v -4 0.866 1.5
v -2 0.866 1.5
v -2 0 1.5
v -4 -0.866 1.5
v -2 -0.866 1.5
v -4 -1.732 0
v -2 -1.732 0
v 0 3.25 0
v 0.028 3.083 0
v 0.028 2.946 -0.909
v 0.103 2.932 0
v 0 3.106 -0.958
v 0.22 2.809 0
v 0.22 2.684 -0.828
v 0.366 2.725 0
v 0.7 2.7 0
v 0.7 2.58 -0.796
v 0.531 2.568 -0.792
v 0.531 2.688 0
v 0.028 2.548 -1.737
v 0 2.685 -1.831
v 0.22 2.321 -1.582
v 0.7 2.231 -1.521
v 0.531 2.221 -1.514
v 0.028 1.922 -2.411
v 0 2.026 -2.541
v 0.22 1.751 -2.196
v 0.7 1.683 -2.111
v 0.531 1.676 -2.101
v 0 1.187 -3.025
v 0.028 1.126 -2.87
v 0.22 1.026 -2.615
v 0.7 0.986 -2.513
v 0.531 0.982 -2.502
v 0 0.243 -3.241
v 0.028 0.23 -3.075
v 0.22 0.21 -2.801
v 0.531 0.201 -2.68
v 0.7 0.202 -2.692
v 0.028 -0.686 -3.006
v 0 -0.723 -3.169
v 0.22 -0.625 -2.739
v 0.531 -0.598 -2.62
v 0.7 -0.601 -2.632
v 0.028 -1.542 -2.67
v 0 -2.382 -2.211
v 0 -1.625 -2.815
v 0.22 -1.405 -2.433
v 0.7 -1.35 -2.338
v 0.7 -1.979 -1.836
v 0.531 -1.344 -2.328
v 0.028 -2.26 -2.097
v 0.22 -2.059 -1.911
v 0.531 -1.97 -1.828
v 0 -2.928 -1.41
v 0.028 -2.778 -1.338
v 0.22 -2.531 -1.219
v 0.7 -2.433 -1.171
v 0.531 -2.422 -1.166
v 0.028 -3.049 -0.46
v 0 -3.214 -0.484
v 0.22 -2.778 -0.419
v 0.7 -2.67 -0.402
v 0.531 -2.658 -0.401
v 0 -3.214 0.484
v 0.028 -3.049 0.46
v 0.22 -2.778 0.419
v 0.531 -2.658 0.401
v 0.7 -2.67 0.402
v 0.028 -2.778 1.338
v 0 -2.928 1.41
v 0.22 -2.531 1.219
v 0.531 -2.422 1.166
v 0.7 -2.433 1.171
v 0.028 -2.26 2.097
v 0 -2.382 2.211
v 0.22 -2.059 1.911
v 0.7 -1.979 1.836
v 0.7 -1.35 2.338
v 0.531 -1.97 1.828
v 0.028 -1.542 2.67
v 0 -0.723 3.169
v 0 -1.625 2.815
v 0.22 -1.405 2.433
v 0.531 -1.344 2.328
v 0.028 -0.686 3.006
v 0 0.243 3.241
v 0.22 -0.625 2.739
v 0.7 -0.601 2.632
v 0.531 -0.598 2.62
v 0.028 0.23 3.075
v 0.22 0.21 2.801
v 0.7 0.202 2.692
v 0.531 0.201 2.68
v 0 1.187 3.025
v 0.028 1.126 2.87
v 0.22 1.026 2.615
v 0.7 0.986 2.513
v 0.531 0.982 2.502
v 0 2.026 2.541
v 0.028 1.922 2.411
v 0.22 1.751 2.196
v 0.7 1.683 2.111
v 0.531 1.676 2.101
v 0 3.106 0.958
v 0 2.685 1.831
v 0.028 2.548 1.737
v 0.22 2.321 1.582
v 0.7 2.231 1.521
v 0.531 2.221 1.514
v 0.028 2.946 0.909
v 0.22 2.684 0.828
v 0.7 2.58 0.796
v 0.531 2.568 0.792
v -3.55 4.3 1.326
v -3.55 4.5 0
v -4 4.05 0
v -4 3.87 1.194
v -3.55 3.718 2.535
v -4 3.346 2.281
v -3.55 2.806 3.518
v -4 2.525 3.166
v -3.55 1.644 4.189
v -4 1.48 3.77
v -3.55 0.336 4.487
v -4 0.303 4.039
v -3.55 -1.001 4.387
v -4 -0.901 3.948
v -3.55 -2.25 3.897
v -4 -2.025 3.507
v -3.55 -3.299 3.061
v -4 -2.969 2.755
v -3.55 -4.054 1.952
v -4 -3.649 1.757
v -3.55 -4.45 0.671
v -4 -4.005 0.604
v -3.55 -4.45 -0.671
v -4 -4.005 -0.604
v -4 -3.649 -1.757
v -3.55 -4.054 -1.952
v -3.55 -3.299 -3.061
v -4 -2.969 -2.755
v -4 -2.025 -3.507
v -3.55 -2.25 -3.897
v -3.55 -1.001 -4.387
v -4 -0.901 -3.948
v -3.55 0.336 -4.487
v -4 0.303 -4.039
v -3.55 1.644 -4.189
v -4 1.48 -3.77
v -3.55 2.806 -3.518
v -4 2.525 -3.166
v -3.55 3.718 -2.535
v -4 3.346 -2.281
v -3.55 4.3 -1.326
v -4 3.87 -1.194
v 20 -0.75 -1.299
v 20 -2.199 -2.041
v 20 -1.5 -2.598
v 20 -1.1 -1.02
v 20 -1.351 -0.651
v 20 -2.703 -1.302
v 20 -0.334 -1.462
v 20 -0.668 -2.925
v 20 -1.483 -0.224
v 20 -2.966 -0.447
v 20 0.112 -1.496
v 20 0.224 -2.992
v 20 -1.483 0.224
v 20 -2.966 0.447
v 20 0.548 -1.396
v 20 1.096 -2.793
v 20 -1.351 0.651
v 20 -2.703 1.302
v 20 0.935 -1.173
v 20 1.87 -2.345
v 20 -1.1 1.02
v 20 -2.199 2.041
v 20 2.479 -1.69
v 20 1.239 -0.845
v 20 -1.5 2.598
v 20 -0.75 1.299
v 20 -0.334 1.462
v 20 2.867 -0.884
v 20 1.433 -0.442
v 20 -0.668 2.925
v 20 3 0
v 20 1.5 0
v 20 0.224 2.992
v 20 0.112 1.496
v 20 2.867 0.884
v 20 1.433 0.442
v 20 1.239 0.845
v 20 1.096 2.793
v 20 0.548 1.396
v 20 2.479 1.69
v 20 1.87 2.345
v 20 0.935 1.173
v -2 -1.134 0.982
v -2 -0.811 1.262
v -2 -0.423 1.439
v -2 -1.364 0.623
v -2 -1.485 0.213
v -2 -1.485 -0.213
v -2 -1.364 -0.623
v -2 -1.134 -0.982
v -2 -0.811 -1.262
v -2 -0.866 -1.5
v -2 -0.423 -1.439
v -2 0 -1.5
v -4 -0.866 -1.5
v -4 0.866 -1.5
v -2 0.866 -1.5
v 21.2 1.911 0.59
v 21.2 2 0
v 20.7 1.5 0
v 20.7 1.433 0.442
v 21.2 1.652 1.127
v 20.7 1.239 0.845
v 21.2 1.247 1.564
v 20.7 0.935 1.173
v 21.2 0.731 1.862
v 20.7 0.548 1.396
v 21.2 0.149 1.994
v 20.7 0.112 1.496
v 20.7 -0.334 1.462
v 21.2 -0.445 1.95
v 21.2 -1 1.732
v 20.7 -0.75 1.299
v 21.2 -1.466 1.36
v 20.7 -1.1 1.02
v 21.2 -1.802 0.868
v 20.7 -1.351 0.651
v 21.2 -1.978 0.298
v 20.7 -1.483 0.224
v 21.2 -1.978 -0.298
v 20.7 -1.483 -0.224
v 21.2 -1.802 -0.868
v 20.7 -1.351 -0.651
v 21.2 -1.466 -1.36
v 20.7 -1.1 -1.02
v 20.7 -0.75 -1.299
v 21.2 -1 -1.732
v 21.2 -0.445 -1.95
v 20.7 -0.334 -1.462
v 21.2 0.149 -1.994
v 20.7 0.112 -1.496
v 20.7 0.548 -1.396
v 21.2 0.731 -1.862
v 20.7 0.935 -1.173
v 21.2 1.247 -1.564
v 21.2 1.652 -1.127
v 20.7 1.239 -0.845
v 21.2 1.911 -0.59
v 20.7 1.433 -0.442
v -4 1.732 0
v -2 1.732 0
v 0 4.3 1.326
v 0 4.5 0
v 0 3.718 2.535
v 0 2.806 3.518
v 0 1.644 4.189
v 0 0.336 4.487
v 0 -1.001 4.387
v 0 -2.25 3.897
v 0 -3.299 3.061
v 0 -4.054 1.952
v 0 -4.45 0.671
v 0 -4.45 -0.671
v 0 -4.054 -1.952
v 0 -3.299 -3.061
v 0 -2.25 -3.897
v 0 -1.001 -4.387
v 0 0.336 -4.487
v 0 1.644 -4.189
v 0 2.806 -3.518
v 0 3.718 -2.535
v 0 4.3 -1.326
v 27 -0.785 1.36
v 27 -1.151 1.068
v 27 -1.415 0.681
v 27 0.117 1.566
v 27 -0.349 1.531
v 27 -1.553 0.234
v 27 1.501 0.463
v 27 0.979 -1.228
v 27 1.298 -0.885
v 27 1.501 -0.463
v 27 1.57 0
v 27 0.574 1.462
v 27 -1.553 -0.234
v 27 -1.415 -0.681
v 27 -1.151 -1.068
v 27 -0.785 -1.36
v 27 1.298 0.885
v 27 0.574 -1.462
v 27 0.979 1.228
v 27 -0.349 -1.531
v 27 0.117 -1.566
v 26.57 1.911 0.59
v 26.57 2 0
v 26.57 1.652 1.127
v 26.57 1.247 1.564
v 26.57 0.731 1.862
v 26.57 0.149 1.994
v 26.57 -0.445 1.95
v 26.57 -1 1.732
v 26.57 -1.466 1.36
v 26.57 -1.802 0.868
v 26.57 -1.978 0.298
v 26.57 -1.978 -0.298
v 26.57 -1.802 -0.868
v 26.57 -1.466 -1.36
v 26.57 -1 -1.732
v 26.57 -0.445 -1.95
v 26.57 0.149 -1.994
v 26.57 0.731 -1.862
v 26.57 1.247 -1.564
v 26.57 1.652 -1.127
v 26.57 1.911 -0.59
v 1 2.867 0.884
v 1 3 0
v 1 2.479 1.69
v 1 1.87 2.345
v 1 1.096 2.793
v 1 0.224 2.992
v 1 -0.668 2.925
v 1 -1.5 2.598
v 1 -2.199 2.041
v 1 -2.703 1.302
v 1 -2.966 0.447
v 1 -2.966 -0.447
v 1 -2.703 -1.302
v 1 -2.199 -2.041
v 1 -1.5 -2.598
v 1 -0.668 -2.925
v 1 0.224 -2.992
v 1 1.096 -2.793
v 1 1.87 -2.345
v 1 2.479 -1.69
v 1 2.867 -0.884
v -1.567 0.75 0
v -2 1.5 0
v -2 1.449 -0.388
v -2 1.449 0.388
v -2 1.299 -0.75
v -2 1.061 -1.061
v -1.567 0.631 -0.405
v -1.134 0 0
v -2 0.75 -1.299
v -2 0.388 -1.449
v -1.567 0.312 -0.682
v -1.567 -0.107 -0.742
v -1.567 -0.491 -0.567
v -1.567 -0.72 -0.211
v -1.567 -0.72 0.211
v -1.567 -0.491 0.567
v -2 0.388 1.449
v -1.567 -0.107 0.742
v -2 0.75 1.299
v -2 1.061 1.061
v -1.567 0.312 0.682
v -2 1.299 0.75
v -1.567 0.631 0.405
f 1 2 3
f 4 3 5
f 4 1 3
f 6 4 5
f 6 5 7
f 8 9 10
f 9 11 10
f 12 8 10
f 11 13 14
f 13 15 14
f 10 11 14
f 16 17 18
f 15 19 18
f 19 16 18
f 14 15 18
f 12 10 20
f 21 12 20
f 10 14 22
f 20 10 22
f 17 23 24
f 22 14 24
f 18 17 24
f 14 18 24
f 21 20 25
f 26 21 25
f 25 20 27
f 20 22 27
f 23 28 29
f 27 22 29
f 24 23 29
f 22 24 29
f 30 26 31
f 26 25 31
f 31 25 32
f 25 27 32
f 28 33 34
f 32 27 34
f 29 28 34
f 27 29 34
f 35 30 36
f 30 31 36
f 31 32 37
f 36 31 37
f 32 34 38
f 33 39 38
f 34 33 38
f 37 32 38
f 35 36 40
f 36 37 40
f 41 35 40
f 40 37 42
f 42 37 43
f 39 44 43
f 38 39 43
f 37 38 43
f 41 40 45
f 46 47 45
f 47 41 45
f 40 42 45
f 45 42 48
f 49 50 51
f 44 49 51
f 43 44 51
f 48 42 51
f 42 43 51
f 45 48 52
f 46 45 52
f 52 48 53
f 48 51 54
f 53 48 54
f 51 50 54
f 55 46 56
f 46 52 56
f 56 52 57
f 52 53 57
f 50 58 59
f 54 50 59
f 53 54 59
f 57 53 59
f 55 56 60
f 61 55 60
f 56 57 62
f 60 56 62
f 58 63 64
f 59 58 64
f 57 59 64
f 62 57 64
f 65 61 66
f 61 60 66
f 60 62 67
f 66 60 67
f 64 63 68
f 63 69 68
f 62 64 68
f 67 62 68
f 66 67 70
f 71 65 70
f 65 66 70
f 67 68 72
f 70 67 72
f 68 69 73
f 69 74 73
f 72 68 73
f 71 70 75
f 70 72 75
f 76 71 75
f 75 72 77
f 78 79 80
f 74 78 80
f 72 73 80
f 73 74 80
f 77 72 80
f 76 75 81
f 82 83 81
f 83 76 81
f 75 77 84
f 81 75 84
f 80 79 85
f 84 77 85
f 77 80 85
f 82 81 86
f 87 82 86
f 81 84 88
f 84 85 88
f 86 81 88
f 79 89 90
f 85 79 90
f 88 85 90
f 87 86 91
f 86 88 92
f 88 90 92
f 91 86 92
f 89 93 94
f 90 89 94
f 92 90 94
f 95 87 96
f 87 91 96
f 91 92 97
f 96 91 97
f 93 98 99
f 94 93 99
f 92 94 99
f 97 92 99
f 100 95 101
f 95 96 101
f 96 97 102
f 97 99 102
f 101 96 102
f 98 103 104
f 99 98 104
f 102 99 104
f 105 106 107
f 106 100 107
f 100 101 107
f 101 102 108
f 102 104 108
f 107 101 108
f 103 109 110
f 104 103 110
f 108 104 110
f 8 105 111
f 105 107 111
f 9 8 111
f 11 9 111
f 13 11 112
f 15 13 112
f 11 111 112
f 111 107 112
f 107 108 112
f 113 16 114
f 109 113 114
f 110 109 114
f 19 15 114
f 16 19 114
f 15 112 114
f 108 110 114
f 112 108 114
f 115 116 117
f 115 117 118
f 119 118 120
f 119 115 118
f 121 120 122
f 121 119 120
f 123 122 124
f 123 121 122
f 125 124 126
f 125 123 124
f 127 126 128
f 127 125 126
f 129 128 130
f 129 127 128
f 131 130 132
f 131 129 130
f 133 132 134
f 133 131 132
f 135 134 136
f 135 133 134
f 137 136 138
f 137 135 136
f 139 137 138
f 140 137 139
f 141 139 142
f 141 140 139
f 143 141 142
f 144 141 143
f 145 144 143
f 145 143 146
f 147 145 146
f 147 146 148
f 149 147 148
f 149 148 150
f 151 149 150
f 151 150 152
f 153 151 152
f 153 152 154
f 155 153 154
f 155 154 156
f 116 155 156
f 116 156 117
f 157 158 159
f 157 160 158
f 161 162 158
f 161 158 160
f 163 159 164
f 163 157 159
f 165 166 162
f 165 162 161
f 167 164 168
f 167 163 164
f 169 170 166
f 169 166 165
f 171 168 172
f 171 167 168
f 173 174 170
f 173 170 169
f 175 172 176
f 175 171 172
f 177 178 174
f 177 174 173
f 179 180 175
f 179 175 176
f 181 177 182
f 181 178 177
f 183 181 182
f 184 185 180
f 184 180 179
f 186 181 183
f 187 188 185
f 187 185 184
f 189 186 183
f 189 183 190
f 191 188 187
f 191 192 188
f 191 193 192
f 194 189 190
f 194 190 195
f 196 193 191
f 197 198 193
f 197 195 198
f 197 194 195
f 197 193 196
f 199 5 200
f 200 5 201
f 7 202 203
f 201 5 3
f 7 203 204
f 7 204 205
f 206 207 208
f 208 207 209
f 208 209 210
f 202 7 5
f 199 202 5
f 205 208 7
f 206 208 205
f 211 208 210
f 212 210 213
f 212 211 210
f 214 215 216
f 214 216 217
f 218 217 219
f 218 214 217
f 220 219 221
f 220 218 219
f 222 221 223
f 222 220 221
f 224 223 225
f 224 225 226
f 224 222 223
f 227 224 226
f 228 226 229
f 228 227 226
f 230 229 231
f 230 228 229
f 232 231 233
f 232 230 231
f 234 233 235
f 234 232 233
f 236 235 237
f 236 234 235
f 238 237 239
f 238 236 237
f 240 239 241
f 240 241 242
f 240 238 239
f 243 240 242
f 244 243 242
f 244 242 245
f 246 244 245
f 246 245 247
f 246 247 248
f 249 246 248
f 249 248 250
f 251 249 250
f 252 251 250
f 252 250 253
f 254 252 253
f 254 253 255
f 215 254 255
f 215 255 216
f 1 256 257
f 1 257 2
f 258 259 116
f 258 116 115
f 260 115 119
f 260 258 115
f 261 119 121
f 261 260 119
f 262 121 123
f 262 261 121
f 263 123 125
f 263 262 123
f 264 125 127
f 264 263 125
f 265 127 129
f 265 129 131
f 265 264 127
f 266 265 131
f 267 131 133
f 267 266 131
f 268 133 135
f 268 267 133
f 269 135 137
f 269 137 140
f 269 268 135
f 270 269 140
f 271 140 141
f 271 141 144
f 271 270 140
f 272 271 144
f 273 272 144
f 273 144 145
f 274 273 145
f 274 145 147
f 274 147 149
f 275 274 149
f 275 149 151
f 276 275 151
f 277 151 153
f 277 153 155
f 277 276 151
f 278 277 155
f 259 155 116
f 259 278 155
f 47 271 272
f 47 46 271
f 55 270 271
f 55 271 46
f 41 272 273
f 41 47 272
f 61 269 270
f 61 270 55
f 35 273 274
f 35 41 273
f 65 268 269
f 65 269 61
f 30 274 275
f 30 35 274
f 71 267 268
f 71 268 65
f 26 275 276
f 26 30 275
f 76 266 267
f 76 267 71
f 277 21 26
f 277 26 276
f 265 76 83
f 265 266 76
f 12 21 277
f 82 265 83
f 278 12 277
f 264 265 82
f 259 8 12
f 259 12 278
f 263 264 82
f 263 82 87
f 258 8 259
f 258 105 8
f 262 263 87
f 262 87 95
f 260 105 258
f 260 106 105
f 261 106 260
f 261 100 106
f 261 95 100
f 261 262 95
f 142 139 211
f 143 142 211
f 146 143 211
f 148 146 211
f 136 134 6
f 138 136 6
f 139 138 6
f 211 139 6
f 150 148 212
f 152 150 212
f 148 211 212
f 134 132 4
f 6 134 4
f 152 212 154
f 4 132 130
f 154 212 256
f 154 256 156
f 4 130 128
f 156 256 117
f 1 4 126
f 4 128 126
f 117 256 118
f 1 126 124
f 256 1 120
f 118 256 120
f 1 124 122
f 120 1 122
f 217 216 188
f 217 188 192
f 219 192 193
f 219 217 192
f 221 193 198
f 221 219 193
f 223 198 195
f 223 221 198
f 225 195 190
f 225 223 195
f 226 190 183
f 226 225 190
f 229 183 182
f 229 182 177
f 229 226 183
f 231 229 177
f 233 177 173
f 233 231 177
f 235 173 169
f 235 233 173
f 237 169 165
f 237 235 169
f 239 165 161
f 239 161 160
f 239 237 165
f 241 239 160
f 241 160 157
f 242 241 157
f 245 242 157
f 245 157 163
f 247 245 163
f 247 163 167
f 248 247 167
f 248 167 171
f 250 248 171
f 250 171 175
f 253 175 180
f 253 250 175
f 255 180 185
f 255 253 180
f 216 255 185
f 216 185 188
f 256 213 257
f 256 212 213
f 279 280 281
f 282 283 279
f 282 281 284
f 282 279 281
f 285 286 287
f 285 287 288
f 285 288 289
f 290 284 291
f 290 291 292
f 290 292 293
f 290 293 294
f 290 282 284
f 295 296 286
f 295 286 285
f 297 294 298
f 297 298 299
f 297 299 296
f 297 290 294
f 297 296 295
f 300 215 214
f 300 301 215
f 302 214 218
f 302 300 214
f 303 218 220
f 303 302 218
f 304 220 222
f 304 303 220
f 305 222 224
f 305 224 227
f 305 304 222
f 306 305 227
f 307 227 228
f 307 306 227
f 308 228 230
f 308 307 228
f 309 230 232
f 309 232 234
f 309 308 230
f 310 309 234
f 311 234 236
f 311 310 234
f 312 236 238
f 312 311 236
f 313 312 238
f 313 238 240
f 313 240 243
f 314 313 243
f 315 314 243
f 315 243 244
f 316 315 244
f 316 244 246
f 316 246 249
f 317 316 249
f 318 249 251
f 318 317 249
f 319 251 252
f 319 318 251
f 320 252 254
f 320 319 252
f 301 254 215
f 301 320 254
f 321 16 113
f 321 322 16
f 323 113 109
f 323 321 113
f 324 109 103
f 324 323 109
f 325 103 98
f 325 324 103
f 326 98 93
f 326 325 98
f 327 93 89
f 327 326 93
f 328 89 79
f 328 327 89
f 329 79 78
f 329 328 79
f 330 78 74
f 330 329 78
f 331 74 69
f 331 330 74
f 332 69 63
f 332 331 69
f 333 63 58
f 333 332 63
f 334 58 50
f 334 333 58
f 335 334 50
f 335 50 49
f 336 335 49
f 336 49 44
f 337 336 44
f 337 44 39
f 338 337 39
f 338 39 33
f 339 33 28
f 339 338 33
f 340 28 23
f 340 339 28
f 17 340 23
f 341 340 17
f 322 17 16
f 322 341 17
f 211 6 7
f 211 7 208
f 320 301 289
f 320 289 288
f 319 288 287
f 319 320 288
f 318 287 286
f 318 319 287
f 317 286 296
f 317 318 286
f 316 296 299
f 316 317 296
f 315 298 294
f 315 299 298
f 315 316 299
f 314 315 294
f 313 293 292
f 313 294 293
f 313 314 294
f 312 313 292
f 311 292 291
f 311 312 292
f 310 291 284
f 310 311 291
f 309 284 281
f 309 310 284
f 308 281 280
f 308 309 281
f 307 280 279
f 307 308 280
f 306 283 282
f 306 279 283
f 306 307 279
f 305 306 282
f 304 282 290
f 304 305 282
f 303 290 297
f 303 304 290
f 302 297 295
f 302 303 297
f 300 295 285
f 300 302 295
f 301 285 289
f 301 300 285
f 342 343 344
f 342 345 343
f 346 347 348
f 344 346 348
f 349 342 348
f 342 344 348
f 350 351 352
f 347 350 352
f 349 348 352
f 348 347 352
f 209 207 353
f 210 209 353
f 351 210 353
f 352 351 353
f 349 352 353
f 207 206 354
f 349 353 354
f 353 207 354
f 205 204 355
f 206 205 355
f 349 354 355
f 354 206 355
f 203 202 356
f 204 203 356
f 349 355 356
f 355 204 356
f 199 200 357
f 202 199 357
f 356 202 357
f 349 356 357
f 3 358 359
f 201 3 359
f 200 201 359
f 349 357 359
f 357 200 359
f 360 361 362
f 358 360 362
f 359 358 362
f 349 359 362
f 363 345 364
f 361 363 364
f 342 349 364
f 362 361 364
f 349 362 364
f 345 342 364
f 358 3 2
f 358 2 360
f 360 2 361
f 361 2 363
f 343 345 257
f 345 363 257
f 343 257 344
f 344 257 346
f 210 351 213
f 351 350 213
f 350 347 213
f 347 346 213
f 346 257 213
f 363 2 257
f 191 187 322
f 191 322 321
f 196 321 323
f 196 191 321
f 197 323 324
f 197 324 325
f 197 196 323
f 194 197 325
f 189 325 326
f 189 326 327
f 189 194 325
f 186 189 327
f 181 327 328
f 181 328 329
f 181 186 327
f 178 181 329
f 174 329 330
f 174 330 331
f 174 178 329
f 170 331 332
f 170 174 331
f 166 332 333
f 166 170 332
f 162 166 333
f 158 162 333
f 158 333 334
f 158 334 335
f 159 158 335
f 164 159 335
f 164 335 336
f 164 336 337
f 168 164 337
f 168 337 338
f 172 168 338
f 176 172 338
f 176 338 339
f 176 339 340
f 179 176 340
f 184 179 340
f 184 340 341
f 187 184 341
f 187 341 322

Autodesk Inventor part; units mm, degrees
ref_plane "YZ Plane" through (0, 0, 0) normal (1, 0, 0) x (0, 1, 0)
ref_plane "XZ Plane" through (0, 0, 0) normal (0, 1, 0) x (-1, 0, 0)
ref_plane "XY Plane" through (0, 0, 0) normal (0, 0, 1) x (1, 0, 0)
sketch "Sketch_7" plane through (0, 0, 0) normal (0, 0, 1) x (1, 0, 0)
  line L0 (27, 0) -> (-1.134, 0)
  line L1 (-1.134, 0) -> (-2, 1.5)
  line L2 (-2, 1.5) -> (-4, 1.5)
  line L3 (-4, 1.5) -> (-4, 4.05)
  line L4 (-4, 4.05) -> (-3.55, 4.5)
  line L5 (-3.55, 4.5) -> (0, 4.5)
  line L6 (0, 4.5) -> (0, 3.25)
  arc A0 (0, 3.25) -> (0.7, 2.7) centre (0.5749, 3.2612) ccw
  line L7 (0.7, 2.7) -> (1, 3)
  line L8 (1, 3) -> (20, 3)
  line L9 (20, 3) -> (20, 1.5)
  line L10 (20, 1.5) -> (20.7, 1.5)
  line L11 (20.7, 1.5) -> (21.2, 2)
  line L12 (21.2, 2) -> (26.5705, 2)
  line L13 (26.5705, 2) -> (27, 1.5705)
  line L14 (27, 1.5705) -> (27, 0)
  line L15 (27, 0) -> (-1.134, 0)
revolve "Revolution1" add sketch "Sketch_7" angle 360 about axis through (27, 0, 0) along (1, 0, 0)
thread "Thread1" size "M4x0.7" class "6g" standard "ISO Metric profile" full length
sketch "Sketch_4" plane through (-4, 0, 0) normal (1, 0, 0) x (0, 0, -1)
  line L0 (-1.5, -0.866) -> (0, -1.7321)
  line L1 (0, -1.7321) -> (1.5, -0.866)
  line L2 (1.5, -0.866) -> (1.5, 0.866)
  line L3 (1.5, 0.866) -> (0, 1.7321)
  line L4 (0, 1.7321) -> (-1.5, 0.866)
  line L5 (-1.5, 0.866) -> (-1.5, -0.866)
extrude "Extrusion1" cut sketch "Sketch_4" along normal blind 2
properties part number "MSB6-20" material "鋼、炭素鋼"
